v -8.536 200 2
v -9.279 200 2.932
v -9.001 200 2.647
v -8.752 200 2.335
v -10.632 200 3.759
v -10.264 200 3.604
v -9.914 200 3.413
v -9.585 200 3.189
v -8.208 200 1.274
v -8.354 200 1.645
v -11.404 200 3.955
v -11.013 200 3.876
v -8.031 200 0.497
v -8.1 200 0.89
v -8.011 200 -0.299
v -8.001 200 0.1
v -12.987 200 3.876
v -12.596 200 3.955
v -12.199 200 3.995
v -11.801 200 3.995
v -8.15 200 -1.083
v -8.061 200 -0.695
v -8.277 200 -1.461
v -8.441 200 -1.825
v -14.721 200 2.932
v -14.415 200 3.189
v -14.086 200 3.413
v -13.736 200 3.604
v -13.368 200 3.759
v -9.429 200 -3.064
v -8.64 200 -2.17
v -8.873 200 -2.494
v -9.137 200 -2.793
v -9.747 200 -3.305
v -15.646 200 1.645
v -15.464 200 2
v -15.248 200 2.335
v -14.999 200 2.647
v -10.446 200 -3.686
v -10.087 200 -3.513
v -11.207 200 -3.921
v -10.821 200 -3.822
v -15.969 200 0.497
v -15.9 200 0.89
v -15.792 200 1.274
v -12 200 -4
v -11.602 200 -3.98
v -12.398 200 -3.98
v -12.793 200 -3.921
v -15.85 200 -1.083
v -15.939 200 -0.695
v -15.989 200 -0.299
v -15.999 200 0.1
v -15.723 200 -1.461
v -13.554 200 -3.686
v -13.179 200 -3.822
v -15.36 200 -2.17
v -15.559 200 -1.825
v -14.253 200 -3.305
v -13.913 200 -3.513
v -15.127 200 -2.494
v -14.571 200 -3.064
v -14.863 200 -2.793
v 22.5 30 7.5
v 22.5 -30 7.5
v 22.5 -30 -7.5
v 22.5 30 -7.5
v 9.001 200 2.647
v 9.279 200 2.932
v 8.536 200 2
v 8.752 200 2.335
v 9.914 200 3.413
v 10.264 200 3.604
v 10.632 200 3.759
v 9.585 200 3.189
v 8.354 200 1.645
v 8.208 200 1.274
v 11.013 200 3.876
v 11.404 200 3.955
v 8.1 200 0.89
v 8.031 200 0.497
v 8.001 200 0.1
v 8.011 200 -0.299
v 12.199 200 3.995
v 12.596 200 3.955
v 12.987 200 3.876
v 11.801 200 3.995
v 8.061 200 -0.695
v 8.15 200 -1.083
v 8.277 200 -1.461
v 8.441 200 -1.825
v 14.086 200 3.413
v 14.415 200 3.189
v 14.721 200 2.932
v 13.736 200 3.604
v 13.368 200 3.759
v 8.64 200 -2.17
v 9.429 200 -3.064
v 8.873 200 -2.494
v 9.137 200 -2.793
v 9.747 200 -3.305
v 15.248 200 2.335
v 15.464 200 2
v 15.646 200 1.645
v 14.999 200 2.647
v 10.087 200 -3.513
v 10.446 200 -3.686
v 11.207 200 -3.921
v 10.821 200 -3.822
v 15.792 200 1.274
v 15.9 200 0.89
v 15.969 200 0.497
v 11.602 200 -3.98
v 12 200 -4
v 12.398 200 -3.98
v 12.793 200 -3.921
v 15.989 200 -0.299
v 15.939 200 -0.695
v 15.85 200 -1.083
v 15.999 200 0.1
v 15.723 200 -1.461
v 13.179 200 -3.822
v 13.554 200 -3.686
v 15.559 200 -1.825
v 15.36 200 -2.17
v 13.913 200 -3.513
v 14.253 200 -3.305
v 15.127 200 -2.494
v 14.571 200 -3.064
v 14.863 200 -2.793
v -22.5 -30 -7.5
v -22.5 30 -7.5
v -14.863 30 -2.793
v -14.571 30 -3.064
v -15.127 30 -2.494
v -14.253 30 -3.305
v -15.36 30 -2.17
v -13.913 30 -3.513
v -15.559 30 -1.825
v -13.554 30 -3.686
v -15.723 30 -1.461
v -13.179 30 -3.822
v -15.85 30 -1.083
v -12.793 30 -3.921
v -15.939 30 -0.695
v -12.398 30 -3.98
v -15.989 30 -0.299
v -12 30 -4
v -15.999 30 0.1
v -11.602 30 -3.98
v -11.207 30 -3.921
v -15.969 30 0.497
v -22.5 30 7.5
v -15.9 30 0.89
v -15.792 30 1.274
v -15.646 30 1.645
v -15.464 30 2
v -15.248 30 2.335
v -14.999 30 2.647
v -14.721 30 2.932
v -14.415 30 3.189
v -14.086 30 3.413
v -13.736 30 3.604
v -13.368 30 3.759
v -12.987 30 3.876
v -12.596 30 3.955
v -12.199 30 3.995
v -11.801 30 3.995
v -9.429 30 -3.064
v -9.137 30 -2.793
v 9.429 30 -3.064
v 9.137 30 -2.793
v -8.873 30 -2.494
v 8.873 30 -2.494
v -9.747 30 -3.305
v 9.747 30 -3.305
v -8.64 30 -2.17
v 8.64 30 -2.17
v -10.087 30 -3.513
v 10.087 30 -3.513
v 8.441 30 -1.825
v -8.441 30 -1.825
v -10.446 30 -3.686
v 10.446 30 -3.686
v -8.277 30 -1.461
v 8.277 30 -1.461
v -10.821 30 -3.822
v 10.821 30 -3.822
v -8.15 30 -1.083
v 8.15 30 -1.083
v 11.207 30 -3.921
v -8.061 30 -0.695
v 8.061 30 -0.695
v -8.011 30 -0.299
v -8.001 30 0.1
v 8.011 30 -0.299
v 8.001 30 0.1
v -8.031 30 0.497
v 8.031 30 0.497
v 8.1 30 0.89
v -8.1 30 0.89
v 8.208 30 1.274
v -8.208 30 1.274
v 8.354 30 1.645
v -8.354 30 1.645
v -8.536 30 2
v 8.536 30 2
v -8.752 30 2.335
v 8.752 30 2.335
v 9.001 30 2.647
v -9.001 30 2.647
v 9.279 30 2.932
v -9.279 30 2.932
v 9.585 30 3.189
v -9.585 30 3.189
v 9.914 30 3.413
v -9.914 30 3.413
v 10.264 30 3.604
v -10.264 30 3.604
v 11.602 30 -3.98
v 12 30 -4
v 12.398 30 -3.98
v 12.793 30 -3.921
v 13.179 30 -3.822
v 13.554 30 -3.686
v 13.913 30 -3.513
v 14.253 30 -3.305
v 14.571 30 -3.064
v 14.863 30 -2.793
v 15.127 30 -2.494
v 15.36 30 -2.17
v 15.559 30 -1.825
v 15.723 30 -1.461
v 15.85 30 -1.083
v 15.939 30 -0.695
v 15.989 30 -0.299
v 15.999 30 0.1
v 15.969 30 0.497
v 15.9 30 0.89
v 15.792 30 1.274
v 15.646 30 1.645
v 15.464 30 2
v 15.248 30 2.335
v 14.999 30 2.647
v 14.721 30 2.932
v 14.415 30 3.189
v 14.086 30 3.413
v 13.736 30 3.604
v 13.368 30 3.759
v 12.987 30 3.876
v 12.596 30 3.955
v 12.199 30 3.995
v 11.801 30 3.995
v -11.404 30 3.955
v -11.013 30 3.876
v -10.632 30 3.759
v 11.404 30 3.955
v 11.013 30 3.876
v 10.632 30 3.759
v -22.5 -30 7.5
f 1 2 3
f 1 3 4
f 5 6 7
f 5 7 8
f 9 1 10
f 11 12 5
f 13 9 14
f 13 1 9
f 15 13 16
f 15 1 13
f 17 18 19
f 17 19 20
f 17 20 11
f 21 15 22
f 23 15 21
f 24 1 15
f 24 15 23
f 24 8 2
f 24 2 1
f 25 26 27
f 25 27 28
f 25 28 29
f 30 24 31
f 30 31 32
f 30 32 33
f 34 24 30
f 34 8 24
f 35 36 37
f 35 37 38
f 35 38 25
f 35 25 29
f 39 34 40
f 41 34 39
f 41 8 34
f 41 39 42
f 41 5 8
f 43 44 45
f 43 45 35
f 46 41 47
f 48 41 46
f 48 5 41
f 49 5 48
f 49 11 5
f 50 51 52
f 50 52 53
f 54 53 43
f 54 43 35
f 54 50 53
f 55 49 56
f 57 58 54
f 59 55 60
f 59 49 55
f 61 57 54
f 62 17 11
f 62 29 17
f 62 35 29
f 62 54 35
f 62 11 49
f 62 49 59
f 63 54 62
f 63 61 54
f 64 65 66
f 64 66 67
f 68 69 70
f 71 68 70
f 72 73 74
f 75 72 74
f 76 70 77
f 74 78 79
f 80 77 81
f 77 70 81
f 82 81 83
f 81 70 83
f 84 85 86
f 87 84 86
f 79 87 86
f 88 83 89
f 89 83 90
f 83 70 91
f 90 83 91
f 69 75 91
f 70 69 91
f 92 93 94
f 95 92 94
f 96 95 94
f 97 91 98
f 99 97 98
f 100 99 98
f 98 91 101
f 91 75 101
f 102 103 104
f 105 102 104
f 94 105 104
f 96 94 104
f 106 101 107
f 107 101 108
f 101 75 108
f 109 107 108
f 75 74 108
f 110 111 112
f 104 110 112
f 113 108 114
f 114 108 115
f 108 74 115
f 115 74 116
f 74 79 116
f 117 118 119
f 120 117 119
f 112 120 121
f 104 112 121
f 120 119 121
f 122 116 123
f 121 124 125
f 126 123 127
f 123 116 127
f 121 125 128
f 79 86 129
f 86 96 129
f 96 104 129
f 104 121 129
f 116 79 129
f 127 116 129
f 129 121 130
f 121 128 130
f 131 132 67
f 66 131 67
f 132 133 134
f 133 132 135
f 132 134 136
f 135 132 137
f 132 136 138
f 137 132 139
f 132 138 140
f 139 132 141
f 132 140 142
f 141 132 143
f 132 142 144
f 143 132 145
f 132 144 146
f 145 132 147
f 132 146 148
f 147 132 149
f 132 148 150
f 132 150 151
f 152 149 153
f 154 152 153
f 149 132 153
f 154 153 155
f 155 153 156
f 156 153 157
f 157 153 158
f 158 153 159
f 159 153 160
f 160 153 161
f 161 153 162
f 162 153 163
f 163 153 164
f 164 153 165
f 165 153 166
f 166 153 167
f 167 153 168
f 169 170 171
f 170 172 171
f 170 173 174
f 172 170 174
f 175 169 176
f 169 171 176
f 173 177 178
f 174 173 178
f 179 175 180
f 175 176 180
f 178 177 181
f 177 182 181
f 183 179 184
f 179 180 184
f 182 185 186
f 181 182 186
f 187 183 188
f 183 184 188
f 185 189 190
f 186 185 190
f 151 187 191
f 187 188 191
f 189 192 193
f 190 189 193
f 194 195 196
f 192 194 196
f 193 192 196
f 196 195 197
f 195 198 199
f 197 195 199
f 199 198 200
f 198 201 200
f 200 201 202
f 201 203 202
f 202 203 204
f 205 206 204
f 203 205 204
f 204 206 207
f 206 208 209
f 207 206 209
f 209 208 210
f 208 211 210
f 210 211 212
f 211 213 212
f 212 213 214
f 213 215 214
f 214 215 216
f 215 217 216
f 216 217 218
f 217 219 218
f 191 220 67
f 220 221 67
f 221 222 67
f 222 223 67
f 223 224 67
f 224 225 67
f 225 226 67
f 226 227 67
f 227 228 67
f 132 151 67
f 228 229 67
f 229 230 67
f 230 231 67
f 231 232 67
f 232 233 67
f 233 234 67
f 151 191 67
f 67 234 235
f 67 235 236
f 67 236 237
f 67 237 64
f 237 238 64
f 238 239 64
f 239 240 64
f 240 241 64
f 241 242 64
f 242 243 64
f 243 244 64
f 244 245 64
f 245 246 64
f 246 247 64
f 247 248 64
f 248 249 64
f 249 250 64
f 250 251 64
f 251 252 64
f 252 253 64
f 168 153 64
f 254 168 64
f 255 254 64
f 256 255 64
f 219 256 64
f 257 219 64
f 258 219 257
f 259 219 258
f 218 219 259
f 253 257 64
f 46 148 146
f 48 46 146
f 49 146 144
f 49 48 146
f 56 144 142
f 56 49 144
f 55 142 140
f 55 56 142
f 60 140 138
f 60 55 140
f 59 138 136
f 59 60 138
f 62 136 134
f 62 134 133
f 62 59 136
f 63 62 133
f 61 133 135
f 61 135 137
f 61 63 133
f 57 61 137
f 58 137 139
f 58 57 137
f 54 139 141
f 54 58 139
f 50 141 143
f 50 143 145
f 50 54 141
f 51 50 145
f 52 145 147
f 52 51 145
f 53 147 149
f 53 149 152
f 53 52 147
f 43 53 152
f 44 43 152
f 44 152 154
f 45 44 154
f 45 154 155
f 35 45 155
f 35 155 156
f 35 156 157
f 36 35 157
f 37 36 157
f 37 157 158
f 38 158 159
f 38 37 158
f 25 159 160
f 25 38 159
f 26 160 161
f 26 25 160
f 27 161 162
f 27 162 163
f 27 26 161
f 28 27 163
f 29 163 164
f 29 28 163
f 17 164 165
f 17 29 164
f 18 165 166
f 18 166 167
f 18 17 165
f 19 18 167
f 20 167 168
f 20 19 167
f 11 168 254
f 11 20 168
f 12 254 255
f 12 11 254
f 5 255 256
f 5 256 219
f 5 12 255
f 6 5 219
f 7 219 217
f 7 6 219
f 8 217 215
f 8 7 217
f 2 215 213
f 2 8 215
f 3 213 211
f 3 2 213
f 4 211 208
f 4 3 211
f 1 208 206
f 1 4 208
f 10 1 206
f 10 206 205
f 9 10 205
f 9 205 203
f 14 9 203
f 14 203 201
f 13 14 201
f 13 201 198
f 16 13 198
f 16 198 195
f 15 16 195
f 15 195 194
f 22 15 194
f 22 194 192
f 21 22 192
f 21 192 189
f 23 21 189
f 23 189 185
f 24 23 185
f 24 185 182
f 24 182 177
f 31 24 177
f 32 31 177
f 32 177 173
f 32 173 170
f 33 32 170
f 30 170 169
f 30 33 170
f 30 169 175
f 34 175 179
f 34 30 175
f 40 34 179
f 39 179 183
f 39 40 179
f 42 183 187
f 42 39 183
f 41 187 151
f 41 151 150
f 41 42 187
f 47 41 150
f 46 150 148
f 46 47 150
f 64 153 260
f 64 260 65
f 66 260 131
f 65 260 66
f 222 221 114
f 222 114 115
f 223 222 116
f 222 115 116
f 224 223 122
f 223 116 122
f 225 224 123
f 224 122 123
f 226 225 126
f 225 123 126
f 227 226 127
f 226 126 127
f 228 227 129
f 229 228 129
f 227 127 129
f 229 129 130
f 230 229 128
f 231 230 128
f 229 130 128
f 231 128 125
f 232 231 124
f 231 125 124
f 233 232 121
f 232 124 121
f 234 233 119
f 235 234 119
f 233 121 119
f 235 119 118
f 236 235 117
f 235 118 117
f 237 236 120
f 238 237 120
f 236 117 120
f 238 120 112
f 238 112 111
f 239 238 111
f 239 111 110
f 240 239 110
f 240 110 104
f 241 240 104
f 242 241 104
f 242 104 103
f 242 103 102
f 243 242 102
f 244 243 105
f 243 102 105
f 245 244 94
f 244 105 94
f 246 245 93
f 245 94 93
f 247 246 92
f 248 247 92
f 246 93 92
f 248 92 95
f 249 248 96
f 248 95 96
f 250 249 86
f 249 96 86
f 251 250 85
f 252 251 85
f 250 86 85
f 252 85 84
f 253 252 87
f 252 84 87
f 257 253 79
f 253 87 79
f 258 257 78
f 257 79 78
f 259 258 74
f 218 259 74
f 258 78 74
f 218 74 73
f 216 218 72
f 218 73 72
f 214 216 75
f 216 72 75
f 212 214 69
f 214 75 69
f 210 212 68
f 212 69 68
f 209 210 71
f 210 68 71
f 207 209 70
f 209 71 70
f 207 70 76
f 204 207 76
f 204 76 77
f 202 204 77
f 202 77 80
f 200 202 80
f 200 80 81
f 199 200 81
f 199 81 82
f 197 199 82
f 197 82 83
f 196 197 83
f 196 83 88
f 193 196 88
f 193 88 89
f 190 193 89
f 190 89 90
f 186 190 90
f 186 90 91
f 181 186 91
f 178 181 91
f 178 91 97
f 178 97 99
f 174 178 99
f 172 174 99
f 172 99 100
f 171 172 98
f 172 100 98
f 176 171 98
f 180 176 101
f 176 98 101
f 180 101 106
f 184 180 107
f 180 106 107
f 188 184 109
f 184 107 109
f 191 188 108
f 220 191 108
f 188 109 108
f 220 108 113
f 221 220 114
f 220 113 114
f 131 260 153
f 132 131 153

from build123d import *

# Parameters (mm, degrees)
CROQUIS1_W              = 45
CROQUIS1_H              = 60
SALIENTE_EXTRUIR1_DEPTH = 7.5
CROQUIS2_W              = 4
CROQUIS2_H              = 170


with BuildPart() as part:
    # Croquis1 → Saliente-Extruir1 (new, symmetric)
    with BuildSketch(Plane.XY):
        Rectangle(CROQUIS1_W, CROQUIS1_H)
    extrude(amount=SALIENTE_EXTRUIR1_DEPTH, both=True)

    # Croquis2 → Revolución1 (revolve)
    with BuildSketch(Plane.XY, mode=Mode.PRIVATE) as revoluci_n1_sk:
        with Locations((-14, 115)):
            Rectangle(CROQUIS2_W, CROQUIS2_H)
    revoluci_n1 = revolve(revoluci_n1_sk.sketch.rotate(Axis((-12, 30, 0), (0, 1, 0)), 270), axis=Axis((-12, 30, 0), (0, 1, 0)))

    # Simetría1: Revolución1 across plane
    add(revoluci_n1.mirror(Plane(origin=(0, 0, 0), x_dir=(0, 0, 1), z_dir=(1, 0, 0))))


solid = part.part
